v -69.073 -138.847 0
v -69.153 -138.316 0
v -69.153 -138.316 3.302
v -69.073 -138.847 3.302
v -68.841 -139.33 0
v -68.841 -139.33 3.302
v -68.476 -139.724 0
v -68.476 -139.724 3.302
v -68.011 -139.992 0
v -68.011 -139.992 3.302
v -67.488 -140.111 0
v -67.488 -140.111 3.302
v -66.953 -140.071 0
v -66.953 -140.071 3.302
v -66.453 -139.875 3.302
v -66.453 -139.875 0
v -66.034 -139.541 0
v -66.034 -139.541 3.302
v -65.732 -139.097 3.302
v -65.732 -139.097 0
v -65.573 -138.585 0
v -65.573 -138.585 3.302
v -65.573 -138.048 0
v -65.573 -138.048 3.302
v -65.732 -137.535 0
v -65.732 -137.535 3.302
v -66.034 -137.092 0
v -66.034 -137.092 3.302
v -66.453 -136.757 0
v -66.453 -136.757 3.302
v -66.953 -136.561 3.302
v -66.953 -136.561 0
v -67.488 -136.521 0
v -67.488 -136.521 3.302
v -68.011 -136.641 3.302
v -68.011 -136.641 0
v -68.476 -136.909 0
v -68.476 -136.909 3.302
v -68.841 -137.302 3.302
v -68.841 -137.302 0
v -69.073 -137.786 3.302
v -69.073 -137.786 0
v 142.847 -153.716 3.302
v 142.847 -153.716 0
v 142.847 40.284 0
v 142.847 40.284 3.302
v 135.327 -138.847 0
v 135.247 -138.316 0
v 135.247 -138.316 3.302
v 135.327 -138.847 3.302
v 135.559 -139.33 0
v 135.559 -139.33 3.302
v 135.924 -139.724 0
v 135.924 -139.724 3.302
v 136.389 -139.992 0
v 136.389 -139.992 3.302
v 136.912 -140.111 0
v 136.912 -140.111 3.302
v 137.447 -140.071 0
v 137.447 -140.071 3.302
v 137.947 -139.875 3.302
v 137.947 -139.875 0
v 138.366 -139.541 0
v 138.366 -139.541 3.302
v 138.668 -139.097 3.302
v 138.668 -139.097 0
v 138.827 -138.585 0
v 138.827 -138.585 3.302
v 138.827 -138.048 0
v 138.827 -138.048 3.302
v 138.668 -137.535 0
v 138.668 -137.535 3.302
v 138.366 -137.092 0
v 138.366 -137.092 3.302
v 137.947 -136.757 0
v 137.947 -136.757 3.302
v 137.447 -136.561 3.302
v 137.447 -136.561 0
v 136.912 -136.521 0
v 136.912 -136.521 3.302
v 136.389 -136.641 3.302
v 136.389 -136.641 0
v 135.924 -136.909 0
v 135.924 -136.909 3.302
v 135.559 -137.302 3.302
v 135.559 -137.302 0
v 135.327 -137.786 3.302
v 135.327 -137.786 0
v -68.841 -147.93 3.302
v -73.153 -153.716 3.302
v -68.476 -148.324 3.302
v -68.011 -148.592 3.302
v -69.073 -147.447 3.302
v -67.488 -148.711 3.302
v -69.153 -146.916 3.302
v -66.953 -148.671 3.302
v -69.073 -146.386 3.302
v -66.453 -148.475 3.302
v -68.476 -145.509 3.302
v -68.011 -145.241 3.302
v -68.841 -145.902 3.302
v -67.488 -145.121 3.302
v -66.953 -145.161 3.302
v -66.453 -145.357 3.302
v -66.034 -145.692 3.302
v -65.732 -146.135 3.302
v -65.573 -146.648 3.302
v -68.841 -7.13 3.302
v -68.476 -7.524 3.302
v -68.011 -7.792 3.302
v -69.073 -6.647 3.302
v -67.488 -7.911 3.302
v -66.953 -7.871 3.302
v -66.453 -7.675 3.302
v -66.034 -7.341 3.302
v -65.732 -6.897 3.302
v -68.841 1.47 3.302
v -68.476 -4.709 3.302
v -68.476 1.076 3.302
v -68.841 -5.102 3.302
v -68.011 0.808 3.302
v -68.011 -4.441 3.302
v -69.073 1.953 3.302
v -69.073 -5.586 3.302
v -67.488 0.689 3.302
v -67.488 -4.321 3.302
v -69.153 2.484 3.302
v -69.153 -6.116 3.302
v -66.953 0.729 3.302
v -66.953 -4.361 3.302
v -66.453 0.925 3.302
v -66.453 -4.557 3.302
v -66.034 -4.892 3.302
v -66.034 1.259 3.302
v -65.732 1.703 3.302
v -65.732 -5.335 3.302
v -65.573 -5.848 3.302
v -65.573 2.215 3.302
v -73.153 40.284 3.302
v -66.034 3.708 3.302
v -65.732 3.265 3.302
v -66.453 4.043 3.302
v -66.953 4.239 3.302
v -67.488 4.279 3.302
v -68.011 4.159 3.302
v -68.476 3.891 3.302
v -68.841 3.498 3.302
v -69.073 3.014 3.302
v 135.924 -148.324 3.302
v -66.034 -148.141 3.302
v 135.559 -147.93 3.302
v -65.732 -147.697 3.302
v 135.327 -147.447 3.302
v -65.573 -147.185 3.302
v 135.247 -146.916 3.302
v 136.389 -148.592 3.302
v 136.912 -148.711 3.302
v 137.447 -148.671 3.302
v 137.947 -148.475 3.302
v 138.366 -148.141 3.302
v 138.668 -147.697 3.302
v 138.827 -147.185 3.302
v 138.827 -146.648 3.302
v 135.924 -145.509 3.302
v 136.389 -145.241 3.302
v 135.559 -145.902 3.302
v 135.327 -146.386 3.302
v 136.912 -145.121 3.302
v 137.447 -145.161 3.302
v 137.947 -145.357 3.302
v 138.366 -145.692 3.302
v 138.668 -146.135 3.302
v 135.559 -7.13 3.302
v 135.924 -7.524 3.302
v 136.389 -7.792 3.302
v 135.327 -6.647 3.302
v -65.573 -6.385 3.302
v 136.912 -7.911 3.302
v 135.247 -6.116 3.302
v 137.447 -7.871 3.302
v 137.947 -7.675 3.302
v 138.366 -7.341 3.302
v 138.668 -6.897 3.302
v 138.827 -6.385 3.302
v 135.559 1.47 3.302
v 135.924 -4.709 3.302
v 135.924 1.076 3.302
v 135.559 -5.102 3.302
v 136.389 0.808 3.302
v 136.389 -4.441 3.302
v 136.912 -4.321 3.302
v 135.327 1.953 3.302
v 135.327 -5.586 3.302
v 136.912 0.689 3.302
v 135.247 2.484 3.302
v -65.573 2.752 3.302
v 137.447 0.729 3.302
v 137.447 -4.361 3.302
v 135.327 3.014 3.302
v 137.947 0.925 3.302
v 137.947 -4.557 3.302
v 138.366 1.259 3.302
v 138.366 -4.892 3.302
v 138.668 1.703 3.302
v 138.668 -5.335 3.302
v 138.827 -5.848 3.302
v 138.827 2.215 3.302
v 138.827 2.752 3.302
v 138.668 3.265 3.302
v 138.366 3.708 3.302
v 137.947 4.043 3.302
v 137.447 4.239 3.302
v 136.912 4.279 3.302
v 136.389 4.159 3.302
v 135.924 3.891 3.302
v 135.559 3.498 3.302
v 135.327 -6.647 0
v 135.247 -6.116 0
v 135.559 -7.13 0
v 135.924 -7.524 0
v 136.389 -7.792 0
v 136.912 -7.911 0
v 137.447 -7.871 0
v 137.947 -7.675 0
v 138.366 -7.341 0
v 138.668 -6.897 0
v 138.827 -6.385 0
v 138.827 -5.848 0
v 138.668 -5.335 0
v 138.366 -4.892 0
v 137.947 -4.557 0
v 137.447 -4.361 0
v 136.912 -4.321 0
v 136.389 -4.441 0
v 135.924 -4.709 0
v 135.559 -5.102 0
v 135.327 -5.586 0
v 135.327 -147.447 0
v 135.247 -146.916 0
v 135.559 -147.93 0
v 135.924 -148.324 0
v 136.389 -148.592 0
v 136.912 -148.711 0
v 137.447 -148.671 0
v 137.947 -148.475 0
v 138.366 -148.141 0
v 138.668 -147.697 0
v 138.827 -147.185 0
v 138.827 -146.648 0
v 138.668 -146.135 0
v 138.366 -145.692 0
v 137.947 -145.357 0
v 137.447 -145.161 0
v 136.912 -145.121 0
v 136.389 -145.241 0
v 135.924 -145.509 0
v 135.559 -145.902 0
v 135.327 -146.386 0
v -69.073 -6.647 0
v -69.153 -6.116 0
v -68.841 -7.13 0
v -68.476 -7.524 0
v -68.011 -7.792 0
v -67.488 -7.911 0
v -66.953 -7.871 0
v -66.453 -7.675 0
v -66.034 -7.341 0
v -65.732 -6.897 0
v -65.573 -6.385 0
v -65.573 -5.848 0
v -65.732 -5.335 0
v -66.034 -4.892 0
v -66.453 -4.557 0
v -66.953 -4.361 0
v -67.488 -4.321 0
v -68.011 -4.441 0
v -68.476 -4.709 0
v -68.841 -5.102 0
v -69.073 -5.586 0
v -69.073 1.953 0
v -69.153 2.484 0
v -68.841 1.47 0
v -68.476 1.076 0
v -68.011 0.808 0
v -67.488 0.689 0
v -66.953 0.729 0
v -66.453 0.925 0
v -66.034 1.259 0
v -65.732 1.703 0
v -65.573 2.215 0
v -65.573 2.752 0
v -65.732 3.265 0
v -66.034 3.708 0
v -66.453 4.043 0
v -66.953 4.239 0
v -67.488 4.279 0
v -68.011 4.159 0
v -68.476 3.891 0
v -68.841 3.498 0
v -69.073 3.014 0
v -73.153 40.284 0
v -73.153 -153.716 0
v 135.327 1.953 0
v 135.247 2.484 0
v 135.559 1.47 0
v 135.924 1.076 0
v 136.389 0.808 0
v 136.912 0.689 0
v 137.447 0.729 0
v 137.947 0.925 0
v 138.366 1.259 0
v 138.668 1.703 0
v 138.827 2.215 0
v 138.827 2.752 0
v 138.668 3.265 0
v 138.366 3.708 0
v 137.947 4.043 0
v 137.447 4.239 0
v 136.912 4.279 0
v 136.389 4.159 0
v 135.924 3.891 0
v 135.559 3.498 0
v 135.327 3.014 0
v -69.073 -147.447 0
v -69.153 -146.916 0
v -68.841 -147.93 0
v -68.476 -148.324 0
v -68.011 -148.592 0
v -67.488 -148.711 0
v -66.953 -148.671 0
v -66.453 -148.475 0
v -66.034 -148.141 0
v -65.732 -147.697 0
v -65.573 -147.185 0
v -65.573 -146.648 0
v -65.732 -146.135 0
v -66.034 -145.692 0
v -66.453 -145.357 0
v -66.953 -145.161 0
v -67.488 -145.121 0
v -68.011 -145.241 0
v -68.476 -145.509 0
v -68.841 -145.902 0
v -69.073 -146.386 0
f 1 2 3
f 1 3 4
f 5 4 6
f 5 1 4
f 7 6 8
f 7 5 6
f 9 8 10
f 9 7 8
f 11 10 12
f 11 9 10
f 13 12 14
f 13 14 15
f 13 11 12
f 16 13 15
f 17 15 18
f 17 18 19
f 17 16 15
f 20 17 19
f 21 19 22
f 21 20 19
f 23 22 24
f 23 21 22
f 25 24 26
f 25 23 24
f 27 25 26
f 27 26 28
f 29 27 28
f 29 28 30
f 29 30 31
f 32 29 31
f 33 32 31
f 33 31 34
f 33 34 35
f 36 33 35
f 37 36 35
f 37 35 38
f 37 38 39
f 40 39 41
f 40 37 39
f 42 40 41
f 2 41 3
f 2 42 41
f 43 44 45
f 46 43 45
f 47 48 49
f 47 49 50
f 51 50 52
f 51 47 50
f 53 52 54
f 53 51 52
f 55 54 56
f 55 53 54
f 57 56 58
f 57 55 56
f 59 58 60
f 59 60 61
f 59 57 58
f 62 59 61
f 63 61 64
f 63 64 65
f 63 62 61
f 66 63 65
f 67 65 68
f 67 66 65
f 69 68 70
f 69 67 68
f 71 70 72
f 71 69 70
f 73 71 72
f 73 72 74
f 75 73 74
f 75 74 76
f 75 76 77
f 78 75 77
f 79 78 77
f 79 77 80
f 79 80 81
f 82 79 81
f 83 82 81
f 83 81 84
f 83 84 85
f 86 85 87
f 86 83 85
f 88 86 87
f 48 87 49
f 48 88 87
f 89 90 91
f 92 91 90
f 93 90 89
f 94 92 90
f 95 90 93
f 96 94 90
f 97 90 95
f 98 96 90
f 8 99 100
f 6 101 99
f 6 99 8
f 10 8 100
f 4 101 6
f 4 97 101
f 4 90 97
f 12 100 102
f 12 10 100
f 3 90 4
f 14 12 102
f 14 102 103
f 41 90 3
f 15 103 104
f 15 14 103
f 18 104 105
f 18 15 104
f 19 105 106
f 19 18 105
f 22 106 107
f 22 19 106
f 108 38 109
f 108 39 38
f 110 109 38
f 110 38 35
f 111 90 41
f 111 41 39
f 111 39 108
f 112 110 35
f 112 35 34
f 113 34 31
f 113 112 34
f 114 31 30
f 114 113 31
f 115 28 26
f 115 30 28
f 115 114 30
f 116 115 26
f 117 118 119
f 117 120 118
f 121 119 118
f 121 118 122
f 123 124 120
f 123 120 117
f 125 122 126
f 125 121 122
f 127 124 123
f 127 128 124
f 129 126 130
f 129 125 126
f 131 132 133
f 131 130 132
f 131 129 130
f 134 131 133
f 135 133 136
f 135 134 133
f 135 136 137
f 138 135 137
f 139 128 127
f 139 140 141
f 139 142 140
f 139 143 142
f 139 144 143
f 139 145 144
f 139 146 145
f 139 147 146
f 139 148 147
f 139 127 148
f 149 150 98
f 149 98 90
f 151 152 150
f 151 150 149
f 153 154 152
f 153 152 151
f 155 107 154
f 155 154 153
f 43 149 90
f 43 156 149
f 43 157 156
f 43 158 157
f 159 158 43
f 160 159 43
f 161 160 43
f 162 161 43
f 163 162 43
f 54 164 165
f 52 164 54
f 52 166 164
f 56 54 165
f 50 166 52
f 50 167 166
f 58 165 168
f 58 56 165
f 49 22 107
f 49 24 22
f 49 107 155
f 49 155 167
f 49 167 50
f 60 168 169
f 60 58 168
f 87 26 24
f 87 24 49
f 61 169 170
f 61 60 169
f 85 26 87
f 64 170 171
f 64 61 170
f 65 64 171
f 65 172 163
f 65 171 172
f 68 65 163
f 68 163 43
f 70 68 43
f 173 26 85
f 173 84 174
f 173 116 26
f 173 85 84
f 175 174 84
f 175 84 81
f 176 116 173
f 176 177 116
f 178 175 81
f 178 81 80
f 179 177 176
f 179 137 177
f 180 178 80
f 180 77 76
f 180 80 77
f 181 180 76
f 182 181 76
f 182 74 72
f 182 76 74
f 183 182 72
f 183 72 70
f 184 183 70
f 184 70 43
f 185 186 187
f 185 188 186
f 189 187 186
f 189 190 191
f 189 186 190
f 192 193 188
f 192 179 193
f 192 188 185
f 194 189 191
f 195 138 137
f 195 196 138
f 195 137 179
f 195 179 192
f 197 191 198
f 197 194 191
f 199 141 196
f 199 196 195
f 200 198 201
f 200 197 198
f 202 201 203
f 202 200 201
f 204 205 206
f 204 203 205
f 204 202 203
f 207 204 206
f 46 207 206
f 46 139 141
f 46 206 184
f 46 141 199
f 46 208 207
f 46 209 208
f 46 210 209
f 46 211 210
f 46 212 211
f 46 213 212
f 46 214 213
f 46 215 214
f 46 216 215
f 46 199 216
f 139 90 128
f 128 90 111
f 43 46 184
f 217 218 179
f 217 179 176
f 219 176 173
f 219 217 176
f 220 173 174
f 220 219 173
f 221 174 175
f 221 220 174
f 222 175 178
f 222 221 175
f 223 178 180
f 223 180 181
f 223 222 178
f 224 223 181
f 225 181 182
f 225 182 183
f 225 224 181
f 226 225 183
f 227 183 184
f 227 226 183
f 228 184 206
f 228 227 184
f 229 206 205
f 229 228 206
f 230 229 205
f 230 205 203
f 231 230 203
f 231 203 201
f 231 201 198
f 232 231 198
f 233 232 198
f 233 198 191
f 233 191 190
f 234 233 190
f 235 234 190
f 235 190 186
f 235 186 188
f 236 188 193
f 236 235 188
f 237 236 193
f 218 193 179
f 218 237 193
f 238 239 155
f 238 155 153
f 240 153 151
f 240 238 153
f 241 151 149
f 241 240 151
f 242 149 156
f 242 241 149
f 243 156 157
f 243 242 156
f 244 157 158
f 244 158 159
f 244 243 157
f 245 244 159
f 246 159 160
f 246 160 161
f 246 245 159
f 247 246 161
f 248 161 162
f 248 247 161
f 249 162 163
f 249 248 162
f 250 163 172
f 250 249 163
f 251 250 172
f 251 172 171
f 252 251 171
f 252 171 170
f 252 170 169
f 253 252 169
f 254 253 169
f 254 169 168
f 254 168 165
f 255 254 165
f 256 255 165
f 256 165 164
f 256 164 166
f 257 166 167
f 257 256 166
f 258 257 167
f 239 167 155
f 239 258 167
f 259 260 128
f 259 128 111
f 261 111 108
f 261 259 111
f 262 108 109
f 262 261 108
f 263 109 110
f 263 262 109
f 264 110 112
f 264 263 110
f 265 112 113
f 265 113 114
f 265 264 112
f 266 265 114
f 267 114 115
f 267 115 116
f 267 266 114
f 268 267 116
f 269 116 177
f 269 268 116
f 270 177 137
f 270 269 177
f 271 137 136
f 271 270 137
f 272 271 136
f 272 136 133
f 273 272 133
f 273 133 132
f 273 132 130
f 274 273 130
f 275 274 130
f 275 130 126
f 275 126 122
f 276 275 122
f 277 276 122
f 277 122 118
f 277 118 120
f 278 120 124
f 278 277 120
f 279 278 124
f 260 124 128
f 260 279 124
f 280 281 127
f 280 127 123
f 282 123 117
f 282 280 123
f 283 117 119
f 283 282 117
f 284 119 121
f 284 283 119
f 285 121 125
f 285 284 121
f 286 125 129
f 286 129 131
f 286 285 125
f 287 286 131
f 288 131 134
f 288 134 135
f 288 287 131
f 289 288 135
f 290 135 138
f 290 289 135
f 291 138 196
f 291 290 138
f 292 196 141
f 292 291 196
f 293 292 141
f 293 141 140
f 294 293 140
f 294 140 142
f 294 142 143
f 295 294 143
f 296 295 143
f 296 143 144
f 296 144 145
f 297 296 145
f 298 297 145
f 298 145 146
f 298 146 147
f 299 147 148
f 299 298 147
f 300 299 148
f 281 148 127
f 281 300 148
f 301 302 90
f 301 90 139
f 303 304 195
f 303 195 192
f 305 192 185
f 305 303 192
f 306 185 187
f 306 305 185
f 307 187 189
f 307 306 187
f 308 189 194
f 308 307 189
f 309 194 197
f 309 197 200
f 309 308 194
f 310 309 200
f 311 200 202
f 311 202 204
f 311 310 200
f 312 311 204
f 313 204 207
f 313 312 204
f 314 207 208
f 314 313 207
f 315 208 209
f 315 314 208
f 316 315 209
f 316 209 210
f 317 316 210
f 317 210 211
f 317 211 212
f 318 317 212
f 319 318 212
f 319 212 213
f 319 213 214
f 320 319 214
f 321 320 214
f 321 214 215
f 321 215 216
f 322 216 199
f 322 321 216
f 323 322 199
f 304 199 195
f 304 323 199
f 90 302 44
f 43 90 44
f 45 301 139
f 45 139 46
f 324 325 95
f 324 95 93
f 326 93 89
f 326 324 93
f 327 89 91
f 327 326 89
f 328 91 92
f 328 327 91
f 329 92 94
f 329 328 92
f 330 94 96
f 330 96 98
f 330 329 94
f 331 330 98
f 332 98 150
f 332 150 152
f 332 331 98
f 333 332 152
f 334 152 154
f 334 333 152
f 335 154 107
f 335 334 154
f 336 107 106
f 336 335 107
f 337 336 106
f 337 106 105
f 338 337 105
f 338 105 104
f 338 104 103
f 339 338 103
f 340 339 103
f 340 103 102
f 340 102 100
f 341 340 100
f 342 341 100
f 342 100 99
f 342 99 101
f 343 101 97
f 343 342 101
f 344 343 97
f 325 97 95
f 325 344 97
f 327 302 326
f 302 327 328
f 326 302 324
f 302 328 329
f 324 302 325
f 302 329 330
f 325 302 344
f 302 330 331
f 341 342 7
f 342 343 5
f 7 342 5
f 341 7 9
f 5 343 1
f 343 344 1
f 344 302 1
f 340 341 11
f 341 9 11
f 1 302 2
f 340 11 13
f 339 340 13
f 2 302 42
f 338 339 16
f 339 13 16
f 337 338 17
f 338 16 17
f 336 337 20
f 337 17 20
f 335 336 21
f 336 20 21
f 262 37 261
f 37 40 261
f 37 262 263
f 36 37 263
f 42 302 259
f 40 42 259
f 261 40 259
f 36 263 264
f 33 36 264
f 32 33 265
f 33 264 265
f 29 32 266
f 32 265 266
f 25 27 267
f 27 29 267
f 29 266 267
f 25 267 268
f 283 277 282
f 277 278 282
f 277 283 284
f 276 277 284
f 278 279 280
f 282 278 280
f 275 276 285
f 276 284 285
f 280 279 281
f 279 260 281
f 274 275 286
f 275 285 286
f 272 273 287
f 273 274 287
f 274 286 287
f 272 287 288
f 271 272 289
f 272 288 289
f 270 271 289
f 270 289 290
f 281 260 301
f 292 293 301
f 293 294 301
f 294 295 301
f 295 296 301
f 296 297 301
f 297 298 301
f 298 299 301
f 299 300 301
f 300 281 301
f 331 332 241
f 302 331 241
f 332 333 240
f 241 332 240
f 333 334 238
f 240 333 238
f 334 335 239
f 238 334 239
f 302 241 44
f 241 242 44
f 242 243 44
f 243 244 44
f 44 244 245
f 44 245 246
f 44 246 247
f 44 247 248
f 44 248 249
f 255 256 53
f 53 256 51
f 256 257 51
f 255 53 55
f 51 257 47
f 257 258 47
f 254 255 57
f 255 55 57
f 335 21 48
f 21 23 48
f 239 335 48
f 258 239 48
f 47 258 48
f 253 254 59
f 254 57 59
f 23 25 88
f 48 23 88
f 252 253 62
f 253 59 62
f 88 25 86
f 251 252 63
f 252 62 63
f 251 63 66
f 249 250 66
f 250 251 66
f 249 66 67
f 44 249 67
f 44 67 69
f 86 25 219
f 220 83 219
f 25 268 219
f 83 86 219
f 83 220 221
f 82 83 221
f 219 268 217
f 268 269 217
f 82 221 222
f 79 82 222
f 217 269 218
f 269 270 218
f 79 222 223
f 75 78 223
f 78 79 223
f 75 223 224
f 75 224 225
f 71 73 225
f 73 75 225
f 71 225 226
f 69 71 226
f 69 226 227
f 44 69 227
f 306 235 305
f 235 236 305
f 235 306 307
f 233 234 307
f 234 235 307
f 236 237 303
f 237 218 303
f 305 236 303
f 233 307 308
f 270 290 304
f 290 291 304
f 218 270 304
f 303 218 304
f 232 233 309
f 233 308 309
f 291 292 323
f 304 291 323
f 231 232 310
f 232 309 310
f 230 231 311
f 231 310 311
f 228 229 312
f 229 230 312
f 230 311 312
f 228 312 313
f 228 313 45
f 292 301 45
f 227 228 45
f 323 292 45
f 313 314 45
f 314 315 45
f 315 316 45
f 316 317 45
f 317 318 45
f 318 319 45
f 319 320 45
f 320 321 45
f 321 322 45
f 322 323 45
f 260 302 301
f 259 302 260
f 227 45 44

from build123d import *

# Parameters (mm, degrees)
SKETCH1_W           = 216
SKETCH1_H           = 194
SKETCH1_R           = 1.8
BOSS_EXTRUDE1_DEPTH = 3.302


with BuildPart() as part:
    # Sketch1 → Boss-Extrude1 (new body)
    with BuildSketch(Plane.XY):
        with Locations((34.846681922, -56.71624714)):
            Rectangle(SKETCH1_W, SKETCH1_H)
        with Locations(Location((-67.353318078, -146.91624714, 0), (0, 0, 180))):
            Circle(SKETCH1_R, mode=Mode.SUBTRACT)
        with Locations(Location((-67.353318078, -138.31624714, 0), (0, 0, 180))):
            Circle(SKETCH1_R, mode=Mode.SUBTRACT)
        with Locations(Location((-67.353318078, -6.11624714, 0), (0, 0, 180))):
            Circle(SKETCH1_R, mode=Mode.SUBTRACT)
        with Locations(Location((137.046681922, 2.48375286, 0), (0, 0, 180))):
            Circle(SKETCH1_R, mode=Mode.SUBTRACT)
        with Locations(Location((137.046681922, -146.91624714, 0), (0, 0, 180))):
            Circle(SKETCH1_R, mode=Mode.SUBTRACT)
        with Locations(Location((137.046681922, -138.31624714, 0), (0, 0, 180))):
            Circle(SKETCH1_R, mode=Mode.SUBTRACT)
        with Locations(Location((137.046681922, -6.11624714, 0), (0, 0, 180))):
            Circle(SKETCH1_R, mode=Mode.SUBTRACT)
        with Locations(Location((-67.353318078, 2.48375286, 0), (0, 0, 180))):
            Circle(SKETCH1_R, mode=Mode.SUBTRACT)
    extrude(amount=BOSS_EXTRUDE1_DEPTH)


solid = part.part
